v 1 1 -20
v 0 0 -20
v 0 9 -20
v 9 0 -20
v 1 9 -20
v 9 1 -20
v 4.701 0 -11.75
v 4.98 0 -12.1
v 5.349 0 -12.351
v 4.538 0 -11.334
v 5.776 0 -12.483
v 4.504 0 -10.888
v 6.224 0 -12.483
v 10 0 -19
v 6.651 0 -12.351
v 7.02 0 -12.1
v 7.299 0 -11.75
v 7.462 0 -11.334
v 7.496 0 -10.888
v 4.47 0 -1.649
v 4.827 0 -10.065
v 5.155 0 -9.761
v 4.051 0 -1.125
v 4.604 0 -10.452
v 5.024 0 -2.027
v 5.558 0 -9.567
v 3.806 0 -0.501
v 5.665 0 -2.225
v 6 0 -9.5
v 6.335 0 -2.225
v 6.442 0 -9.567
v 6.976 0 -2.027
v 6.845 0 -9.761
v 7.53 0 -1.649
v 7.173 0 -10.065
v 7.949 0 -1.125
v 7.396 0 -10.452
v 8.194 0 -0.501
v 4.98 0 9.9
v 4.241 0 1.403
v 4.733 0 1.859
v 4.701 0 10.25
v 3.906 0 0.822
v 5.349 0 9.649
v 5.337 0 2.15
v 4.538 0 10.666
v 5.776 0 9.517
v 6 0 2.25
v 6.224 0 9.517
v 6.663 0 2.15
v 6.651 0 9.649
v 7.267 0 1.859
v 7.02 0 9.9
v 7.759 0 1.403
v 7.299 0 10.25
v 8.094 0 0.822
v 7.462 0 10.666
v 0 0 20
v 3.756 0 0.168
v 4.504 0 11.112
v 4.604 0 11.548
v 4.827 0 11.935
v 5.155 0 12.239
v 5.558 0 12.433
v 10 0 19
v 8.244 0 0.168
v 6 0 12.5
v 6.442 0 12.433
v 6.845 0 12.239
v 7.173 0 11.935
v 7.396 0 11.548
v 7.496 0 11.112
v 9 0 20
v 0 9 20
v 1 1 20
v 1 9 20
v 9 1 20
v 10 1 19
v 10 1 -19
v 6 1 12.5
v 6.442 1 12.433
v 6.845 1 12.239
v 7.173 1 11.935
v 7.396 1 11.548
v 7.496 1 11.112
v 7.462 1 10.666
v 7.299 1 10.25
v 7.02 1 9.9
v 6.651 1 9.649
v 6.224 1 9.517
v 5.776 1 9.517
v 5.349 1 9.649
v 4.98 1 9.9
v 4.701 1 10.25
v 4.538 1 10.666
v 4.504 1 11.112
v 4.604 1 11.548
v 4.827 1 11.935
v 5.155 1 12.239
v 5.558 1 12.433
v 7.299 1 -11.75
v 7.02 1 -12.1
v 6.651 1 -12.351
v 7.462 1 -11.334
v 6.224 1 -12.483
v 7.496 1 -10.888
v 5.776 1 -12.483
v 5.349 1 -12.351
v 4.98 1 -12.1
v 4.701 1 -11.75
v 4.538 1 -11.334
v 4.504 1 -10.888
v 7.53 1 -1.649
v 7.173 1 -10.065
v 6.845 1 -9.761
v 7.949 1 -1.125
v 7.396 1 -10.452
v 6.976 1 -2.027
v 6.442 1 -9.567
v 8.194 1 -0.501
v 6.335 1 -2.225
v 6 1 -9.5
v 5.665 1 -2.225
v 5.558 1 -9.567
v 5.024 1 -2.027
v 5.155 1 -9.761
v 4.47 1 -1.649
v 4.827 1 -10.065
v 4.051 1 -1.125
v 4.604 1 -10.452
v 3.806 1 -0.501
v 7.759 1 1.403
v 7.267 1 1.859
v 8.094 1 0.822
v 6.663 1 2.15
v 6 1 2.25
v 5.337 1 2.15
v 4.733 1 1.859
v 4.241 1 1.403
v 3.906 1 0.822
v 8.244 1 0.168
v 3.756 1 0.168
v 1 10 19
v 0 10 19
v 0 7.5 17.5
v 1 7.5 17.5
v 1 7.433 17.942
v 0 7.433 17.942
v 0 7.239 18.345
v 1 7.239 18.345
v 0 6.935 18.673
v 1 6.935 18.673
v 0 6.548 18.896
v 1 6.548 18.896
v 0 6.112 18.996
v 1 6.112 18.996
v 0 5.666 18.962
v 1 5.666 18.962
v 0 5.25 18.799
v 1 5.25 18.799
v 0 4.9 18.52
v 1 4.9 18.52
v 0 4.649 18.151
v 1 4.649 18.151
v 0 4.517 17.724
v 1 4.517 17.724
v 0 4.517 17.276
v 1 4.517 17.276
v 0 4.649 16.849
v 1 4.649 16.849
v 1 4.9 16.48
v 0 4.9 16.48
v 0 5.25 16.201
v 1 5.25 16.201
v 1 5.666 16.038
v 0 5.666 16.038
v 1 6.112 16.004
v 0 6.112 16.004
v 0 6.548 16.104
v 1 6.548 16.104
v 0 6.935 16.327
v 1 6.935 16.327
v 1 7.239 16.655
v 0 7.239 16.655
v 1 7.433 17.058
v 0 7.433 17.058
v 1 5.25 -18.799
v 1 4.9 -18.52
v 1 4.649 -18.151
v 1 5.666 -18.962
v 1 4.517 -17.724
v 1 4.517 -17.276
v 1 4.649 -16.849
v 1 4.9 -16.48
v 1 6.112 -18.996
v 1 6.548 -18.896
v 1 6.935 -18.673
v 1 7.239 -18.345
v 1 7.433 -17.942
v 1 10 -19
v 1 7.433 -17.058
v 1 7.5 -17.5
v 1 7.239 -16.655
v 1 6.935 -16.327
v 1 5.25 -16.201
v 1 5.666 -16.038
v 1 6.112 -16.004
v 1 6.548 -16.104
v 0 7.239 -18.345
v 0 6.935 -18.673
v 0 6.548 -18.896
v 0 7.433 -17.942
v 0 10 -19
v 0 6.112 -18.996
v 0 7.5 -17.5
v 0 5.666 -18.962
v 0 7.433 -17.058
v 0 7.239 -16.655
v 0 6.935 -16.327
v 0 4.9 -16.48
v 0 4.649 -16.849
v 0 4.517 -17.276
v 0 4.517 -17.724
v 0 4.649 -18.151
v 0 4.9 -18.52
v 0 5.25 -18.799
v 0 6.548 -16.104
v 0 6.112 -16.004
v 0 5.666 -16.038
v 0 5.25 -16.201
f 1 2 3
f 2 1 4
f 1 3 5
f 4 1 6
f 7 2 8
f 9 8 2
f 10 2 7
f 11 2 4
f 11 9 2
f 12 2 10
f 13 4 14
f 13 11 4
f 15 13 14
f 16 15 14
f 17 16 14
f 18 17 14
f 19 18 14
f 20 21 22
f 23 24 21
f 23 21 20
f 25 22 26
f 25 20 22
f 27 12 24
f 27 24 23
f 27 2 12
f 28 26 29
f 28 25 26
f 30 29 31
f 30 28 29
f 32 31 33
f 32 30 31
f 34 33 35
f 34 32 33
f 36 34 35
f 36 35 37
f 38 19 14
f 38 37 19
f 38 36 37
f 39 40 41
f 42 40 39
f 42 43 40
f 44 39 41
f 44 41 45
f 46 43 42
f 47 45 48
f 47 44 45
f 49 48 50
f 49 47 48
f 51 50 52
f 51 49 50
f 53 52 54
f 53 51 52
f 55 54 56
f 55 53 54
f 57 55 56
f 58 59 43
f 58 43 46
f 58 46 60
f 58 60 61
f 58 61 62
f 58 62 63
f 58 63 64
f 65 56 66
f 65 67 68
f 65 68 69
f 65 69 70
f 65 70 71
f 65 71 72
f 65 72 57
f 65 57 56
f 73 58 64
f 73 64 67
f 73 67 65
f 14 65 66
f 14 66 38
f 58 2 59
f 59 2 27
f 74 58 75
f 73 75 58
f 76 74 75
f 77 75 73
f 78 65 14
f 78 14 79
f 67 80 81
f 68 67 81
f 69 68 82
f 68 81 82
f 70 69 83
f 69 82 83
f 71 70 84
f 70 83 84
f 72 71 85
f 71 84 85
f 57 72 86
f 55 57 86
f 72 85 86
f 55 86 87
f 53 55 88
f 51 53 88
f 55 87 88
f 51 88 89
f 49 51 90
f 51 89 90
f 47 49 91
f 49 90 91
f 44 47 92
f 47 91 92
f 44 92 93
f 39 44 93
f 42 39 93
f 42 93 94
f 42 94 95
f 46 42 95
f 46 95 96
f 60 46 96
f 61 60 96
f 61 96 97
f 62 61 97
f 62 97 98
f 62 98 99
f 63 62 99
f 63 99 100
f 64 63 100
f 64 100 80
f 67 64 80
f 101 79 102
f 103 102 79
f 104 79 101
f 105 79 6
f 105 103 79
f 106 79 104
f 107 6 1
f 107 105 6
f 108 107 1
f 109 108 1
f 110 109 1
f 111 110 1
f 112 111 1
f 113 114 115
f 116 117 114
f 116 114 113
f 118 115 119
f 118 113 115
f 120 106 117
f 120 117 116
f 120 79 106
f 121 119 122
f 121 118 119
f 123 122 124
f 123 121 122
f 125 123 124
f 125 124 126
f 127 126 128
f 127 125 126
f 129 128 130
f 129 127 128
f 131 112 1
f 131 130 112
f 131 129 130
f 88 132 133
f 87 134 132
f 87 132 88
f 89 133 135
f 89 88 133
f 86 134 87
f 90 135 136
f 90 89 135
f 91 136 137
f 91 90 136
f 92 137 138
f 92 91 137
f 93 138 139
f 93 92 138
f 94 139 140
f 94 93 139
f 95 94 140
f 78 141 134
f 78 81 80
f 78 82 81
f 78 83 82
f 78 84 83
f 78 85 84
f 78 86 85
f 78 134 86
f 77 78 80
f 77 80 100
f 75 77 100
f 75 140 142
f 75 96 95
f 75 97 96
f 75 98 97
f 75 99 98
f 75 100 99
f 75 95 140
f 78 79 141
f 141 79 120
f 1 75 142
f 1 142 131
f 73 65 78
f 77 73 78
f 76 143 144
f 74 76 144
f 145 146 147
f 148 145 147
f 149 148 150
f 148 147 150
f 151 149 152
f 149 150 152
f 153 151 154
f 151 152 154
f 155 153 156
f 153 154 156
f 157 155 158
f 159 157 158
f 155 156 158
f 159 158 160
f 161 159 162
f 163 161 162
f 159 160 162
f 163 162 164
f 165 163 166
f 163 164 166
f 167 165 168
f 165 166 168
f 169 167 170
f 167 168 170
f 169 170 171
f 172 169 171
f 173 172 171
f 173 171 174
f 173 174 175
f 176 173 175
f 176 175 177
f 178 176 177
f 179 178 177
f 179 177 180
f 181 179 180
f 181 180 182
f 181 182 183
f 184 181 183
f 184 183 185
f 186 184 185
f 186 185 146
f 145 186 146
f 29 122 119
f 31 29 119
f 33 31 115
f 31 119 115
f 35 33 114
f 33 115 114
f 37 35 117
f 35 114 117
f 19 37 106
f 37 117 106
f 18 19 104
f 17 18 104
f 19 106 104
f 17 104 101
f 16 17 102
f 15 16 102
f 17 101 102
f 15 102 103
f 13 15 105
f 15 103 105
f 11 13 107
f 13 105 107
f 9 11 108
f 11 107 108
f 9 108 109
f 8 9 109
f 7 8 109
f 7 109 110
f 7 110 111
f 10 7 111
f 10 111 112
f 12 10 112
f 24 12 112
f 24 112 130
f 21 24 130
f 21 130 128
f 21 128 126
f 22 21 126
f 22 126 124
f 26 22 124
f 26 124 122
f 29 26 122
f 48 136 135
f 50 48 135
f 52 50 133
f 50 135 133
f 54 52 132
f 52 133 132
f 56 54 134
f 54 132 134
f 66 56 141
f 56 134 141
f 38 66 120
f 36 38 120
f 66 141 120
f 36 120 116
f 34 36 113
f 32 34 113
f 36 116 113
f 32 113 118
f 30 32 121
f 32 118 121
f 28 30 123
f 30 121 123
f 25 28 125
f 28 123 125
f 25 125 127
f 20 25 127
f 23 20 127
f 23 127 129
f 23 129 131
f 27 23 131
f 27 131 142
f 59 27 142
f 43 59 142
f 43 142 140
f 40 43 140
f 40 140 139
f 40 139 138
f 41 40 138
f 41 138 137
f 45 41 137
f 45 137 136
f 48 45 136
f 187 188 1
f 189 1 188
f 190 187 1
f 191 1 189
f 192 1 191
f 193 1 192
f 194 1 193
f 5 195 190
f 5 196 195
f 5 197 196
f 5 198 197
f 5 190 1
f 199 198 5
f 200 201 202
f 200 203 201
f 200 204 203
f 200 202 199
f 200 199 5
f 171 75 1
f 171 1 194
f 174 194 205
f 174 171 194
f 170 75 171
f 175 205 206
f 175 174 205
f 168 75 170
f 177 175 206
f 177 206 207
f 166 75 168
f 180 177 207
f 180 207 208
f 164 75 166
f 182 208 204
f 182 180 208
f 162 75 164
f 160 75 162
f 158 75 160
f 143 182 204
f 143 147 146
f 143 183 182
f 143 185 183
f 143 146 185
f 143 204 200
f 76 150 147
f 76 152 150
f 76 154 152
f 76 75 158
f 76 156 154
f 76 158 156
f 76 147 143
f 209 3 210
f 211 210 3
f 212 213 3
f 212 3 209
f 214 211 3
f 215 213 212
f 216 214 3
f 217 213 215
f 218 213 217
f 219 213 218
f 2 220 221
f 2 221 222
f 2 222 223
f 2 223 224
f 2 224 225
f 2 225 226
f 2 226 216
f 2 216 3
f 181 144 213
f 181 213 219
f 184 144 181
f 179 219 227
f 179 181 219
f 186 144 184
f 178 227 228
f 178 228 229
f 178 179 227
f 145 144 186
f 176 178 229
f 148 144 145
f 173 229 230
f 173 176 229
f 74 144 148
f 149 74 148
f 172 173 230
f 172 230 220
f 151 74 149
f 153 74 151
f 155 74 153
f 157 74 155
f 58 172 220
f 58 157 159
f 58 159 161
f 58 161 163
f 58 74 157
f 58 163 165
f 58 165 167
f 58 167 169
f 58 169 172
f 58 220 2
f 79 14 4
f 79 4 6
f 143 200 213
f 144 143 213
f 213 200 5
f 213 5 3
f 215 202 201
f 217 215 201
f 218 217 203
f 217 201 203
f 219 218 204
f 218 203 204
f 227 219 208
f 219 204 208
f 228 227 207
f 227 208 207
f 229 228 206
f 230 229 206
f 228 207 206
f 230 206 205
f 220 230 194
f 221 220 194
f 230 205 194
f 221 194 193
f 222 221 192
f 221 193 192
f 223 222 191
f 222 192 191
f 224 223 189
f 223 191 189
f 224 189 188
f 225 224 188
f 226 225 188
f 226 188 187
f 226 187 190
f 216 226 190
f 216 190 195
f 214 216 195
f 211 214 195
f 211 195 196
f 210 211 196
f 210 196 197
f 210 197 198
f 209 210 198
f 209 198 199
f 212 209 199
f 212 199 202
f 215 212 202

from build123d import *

# Parameters (mm, degrees)
LINEAR_AUSTRAGEN_D_NN1_DEPTH    = 20
FASE1_SIZE                      = 1
SKIZZE2_R                       = 1.5
SCHNITT_LINEAR_AUSTRAGEN1_DEPTH = 10
SKIZZE3_R                       = 1.5
SCHNITT_LINEAR_AUSTRAGEN2_DEPTH = 10
SKIZZE4_R                       = 2.25
SCHNITT_LINEAR_AUSTRAGEN3_DEPTH = 10


with BuildPart() as part:
    # Skizze1 → Linear-Austragen-Dünn1 (new, symmetric)
    with BuildSketch(Plane.XY):
        Polygon((0, 10), (0, 0), (10, 0), (10, 1), (1, 1), (1, 10), align=None)
    extrude(amount=LINEAR_AUSTRAGEN_D_NN1_DEPTH, both=True)

    # Fase1
    fase1_edges = [part.edges().sort_by_distance(p)[0] for p in [
        (0.5, 10, 20),
        (0.5, 10, -20),
        (10, 0.5, -20),
        (10, 0.5, 20),
    ]]
    chamfer(fase1_edges, length=FASE1_SIZE)

    # Skizze2 → Schnitt-Linear austragen1 (cut)
    with BuildSketch(Plane(origin=(1, 0, 0), x_dir=(0, 0, -1), z_dir=(1, 0, 0))):
        with Locations(Location((-17.5, 6, 0), (0, 0, 90))):
            Circle(SKIZZE2_R)
        with Locations(Location((17.5, 6, 0), (0, 0, 90))):
            Circle(SKIZZE2_R)
    extrude(amount=-SCHNITT_LINEAR_AUSTRAGEN1_DEPTH, mode=Mode.SUBTRACT)

    # Skizze3 → Schnitt-Linear austragen2 (cut)
    with BuildSketch(Plane(origin=(0, 1, 0), x_dir=(1, 0, 0), z_dir=(0, 1, 0))):
        with Locations(Location((6, -11, 0), (0, 0, 270))):
            Circle(SKIZZE3_R)
        with Locations(Location((6, 11, 0), (0, 0, 270))):
            Circle(SKIZZE3_R)
    extrude(amount=-SCHNITT_LINEAR_AUSTRAGEN2_DEPTH, mode=Mode.SUBTRACT)

    # Skizze4 → Schnitt-Linear austragen3 (cut)
    with BuildSketch(Plane(origin=(0, 1, 0), x_dir=(1, 0, 0), z_dir=(0, 1, 0))):
        with Locations(Location((6, 0, 0), (0, 0, 270))):
            Circle(SKIZZE4_R)
    extrude(amount=-SCHNITT_LINEAR_AUSTRAGEN3_DEPTH, mode=Mode.SUBTRACT)


solid = part.part
